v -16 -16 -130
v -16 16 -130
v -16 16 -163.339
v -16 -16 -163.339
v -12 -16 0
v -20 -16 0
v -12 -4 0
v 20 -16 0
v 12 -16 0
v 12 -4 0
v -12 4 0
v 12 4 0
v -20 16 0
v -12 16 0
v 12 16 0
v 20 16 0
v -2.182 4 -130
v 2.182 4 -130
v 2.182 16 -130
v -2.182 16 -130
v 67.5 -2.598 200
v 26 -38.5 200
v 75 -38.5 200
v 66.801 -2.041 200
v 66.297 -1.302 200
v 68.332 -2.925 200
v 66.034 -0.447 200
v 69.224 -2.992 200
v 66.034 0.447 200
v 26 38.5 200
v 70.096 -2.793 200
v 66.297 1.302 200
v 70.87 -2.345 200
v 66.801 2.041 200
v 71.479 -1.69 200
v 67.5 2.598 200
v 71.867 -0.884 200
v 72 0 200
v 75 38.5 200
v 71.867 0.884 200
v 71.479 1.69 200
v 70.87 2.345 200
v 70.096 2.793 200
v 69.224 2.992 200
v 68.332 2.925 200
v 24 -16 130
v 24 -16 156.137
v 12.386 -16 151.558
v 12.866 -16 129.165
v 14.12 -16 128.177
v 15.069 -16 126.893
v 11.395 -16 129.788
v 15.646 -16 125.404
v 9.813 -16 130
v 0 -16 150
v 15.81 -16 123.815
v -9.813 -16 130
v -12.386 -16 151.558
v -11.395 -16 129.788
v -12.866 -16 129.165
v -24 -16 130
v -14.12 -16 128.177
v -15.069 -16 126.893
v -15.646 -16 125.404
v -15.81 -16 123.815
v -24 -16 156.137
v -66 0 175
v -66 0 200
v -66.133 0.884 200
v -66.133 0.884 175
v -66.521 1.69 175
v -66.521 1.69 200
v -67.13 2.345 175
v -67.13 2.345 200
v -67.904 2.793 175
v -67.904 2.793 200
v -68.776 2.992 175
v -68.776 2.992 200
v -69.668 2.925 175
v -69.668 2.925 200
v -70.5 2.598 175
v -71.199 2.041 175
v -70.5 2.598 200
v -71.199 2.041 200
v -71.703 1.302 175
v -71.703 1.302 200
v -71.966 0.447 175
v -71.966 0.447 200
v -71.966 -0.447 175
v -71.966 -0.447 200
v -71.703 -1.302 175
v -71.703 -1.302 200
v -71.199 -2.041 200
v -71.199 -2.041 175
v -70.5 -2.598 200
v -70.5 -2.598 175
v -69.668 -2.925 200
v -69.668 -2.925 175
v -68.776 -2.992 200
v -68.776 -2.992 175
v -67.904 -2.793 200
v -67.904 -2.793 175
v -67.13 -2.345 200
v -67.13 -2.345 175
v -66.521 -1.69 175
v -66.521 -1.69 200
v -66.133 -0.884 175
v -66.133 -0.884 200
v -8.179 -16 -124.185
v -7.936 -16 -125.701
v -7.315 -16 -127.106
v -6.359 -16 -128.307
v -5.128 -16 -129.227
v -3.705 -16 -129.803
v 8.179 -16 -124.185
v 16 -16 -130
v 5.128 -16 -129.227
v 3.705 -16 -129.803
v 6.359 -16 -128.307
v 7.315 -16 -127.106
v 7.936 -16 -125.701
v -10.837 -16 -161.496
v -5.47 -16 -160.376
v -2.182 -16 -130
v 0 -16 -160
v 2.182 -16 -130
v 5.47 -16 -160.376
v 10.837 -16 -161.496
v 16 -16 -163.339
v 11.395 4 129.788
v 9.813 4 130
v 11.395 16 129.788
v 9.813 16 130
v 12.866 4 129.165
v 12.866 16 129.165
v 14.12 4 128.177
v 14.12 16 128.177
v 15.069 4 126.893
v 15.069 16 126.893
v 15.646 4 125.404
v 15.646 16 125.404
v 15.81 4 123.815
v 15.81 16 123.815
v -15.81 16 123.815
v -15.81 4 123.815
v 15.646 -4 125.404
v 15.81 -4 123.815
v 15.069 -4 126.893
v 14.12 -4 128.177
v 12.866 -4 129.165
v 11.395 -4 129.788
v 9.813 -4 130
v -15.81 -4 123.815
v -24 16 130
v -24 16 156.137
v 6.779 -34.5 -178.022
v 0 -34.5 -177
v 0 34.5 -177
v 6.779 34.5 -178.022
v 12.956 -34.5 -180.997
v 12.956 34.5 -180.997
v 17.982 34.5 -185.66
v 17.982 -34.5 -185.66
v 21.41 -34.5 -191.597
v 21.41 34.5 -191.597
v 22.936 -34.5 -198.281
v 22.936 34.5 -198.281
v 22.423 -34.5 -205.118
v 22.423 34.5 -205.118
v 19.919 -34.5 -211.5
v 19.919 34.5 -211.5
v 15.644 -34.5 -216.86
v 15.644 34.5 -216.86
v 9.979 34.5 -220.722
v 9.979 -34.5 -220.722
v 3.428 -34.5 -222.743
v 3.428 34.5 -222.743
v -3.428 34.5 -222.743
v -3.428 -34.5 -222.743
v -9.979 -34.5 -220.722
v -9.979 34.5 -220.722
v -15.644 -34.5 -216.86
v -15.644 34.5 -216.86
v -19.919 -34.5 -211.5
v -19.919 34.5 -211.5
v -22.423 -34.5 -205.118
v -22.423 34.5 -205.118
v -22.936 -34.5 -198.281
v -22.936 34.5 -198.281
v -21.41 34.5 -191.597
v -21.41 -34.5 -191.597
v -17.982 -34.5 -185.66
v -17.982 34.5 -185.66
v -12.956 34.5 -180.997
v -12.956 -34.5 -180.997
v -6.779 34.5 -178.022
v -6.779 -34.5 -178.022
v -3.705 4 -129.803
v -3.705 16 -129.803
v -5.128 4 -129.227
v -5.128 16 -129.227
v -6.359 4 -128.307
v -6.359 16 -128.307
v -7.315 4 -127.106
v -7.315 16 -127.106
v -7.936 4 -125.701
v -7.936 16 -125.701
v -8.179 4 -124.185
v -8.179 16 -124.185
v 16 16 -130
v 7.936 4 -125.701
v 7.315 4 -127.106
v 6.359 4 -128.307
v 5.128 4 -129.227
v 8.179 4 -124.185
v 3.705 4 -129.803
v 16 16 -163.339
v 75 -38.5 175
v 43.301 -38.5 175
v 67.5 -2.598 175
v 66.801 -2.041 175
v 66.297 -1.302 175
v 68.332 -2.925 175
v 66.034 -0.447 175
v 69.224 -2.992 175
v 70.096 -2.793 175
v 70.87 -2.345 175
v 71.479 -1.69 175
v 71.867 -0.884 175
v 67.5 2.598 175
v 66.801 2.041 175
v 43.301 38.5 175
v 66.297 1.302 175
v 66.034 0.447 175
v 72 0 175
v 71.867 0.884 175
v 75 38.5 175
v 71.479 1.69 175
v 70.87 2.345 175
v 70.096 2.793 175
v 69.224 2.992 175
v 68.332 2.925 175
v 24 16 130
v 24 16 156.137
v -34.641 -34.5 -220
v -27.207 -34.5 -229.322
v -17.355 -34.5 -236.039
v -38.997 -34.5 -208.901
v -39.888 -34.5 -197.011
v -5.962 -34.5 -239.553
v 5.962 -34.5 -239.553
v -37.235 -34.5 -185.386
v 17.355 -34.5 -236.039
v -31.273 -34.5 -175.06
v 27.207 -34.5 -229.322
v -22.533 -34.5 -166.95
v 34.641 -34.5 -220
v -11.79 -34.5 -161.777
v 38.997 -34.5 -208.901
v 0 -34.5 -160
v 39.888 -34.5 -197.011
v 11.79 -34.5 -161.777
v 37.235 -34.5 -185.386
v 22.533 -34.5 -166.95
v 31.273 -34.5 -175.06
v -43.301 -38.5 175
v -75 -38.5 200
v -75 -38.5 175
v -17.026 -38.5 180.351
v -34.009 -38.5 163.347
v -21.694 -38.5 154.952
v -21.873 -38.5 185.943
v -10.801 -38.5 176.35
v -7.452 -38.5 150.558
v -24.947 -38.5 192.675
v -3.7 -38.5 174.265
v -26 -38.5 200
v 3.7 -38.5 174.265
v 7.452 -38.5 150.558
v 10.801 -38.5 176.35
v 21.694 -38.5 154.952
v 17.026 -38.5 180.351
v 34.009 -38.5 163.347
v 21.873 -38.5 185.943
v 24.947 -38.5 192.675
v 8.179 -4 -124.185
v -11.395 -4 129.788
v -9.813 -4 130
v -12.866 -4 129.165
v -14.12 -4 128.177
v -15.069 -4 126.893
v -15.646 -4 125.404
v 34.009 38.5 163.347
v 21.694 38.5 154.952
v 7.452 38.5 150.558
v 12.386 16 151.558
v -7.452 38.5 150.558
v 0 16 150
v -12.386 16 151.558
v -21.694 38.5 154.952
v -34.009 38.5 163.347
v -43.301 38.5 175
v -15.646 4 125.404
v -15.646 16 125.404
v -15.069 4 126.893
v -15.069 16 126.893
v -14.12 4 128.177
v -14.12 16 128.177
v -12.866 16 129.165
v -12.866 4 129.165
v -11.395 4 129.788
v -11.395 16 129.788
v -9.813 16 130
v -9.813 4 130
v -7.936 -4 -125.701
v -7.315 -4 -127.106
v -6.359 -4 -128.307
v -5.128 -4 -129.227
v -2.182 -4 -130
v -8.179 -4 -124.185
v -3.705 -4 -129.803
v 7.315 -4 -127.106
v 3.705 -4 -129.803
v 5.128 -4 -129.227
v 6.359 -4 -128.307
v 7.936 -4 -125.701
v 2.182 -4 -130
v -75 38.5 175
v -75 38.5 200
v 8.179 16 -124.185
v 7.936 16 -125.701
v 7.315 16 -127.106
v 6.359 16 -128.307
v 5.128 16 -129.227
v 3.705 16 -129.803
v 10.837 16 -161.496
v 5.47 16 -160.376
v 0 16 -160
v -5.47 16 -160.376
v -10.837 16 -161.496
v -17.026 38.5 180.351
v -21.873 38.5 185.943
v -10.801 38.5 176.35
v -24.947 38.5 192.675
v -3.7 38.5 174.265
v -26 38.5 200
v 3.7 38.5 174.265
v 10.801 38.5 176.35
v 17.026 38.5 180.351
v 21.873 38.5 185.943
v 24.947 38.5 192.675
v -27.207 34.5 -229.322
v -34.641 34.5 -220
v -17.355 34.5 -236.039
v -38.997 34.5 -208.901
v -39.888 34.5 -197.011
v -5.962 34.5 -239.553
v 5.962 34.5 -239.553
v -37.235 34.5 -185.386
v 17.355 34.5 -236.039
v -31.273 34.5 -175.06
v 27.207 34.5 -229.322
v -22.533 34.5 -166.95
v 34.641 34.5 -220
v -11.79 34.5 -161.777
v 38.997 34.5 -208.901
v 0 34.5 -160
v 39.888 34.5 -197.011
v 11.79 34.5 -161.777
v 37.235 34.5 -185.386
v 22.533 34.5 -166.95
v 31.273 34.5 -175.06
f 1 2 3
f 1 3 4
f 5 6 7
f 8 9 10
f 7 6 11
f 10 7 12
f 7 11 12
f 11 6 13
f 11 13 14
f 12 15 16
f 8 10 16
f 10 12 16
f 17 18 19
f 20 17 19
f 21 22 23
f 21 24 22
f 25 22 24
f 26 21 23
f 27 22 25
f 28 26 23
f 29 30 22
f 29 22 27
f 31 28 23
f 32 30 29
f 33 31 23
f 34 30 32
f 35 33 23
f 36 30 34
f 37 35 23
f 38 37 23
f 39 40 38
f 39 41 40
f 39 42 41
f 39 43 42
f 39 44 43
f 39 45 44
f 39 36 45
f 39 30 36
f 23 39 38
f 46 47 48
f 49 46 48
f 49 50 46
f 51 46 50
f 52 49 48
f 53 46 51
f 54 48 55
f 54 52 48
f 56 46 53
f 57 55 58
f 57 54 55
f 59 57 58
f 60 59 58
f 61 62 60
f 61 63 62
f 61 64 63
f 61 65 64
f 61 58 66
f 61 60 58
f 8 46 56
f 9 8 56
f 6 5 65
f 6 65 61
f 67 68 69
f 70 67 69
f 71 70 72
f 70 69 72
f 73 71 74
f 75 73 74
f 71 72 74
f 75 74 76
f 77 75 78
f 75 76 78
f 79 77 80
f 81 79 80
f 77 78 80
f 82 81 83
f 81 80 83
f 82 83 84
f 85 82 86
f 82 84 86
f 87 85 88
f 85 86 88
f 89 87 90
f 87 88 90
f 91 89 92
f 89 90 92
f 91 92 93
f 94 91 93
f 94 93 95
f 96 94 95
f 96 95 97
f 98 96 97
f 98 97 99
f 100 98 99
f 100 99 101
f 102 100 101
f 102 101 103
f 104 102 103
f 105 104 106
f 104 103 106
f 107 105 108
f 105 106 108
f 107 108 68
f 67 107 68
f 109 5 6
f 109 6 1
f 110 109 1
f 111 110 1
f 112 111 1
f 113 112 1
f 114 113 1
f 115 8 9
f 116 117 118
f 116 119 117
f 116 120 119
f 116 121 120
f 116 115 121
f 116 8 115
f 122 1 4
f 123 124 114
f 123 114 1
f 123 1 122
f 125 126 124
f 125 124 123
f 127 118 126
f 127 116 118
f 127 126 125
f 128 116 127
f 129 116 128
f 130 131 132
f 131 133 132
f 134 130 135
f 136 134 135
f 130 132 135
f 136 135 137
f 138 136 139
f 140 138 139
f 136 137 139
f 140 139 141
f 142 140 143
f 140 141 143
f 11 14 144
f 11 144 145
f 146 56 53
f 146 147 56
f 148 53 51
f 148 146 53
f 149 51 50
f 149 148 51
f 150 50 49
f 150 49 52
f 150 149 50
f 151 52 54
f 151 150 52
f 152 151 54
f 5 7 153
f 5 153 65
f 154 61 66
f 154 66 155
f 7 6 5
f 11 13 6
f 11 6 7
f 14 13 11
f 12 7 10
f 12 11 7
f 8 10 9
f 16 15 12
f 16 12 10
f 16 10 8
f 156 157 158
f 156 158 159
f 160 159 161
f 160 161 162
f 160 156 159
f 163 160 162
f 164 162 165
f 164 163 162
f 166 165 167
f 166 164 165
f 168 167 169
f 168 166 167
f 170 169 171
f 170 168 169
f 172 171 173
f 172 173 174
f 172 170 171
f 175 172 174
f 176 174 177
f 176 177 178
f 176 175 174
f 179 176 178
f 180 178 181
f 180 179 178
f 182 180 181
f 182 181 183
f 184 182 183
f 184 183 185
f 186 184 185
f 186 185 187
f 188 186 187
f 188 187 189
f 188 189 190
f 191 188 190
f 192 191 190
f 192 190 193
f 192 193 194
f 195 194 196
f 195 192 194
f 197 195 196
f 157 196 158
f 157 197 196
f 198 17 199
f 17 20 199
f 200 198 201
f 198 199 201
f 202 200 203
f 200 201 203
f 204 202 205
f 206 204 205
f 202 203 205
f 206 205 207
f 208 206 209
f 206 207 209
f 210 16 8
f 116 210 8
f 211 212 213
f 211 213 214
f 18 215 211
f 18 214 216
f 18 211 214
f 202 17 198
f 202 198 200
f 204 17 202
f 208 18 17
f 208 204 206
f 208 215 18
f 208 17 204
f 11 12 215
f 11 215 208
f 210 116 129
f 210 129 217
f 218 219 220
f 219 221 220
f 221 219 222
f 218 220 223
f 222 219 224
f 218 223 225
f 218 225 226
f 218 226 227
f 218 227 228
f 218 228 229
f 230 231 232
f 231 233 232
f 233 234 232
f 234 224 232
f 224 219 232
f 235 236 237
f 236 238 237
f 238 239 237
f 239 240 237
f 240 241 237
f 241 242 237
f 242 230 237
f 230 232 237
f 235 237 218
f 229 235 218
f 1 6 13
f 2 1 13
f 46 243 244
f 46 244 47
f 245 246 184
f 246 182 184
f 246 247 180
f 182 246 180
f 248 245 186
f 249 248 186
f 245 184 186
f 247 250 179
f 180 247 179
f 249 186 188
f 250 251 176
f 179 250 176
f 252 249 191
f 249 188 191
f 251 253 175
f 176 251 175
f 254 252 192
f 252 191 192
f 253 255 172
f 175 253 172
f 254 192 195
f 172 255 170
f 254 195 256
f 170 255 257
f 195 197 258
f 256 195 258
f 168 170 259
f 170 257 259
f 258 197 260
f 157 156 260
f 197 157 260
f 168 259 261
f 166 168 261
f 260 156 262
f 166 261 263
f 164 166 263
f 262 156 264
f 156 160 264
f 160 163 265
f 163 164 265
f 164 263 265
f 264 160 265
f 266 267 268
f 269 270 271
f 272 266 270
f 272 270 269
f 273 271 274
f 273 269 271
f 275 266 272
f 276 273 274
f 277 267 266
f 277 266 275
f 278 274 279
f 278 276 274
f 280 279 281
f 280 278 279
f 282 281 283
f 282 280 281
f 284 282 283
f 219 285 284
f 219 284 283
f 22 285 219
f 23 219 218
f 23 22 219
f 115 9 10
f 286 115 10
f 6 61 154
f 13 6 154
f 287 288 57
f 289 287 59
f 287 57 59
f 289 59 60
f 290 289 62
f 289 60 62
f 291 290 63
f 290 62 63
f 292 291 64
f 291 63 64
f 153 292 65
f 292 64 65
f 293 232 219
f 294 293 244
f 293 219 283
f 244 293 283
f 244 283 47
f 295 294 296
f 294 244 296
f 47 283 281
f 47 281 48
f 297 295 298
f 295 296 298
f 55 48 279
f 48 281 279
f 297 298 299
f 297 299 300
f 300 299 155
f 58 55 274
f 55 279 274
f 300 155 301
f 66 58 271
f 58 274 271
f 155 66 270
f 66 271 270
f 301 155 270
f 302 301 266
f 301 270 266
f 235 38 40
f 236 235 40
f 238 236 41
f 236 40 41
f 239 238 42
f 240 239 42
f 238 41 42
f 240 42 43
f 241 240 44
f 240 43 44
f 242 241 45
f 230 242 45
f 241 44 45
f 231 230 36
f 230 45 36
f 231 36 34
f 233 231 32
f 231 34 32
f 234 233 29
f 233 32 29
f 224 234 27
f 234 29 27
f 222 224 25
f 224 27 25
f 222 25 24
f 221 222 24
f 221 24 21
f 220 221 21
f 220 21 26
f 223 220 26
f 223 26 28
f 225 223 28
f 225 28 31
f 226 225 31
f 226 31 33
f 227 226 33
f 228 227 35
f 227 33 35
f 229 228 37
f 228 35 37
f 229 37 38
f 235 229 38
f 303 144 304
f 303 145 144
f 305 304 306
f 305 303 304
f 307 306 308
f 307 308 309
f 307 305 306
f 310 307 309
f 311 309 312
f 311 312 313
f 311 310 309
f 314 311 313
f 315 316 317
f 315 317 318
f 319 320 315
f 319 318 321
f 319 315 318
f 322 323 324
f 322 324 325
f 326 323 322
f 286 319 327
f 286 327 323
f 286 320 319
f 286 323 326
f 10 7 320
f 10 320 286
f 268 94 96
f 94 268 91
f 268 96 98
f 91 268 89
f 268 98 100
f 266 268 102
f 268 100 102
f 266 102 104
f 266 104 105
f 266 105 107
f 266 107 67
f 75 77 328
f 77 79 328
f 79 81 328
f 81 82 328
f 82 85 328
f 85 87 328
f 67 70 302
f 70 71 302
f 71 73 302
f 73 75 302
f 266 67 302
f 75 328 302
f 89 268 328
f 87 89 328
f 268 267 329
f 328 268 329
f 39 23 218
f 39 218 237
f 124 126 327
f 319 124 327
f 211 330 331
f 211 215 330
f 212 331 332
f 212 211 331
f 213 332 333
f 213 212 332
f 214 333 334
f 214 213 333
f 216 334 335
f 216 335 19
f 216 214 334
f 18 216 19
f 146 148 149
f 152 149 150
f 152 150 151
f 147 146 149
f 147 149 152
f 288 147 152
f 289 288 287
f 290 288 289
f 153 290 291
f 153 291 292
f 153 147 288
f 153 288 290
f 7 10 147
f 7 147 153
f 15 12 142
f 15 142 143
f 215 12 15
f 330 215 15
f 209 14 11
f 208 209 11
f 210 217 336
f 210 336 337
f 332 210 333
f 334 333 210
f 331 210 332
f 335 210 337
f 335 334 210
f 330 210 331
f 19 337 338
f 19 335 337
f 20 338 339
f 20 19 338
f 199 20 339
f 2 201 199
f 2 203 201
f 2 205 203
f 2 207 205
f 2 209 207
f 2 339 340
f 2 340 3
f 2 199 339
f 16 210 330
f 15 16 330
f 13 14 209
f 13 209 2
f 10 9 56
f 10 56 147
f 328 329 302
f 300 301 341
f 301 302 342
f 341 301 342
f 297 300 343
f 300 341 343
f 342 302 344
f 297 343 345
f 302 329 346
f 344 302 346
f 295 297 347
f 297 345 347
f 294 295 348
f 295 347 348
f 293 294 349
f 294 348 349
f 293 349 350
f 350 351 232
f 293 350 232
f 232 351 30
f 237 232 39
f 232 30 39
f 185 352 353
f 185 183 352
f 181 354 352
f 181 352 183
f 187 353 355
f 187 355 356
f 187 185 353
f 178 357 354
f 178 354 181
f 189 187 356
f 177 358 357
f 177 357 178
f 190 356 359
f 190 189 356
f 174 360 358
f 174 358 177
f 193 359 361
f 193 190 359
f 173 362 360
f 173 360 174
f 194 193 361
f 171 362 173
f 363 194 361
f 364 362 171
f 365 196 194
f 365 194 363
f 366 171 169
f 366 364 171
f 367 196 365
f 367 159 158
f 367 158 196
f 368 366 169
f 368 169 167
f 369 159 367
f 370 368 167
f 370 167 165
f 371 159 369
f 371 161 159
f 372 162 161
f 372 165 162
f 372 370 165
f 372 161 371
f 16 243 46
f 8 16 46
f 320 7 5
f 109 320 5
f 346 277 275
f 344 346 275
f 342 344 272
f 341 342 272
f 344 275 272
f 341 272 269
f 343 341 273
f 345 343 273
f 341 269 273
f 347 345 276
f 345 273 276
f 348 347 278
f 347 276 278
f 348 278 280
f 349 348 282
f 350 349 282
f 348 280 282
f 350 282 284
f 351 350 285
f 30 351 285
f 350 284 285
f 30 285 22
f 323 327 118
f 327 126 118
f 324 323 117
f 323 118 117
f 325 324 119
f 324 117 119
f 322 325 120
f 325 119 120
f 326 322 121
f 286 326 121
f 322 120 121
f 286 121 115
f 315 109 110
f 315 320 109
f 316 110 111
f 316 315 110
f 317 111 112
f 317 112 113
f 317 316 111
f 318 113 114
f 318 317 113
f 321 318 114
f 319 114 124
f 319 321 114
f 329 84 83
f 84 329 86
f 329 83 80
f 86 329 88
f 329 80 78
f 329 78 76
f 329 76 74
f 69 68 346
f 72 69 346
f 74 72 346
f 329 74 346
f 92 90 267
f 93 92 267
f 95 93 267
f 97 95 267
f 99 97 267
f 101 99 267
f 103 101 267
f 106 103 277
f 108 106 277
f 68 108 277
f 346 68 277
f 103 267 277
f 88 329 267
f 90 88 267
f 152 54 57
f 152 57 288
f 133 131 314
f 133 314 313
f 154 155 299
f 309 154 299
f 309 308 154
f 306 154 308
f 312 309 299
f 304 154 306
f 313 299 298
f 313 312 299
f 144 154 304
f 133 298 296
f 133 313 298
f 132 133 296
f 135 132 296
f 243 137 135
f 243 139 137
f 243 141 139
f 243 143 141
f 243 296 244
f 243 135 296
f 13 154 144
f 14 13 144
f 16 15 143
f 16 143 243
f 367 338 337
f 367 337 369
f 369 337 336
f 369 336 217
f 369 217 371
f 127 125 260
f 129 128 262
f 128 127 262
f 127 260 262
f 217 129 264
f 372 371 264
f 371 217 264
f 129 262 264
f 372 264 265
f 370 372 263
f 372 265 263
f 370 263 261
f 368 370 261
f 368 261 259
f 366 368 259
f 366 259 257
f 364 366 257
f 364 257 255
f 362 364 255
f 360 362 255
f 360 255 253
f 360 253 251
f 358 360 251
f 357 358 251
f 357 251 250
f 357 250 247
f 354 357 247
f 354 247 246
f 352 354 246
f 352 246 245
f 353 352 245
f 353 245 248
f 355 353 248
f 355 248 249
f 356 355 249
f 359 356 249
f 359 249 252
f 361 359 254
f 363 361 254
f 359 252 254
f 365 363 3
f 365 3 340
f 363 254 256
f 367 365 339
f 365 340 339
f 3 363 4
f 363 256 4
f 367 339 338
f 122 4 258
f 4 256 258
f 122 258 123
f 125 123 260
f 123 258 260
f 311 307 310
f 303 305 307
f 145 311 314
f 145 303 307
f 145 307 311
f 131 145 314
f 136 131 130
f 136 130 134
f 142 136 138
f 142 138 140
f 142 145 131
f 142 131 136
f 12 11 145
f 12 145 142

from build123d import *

# Parameters (mm, degrees)
BOSS_EXTRUDE1_DEPTH      = 34.5
BOSS_EXTRUDE1_DEPTH_BACK = 34.5
SKETCH1_R                = 40
SKETCH1_R_2              = 23
BOSS_EXTRUDE2_DEPTH      = 38.5
BOSS_EXTRUDE2_DEPTH_BACK = 38.5
BOSS_EXTRUDE4_REACH      = 337.98
BOSS_EXTRUDE4_END_RADIUS = 23
BOSS_EXTRUDE5_REACH      = 377.343
BOSS_EXTRUDE5_END_RADIUS = 26
SKETCH5_W                = 37
SKETCH5_H                = 77
SKETCH5_R                = 3
BOSS_EXTRUDE6_DEPTH      = 25
SKETCH7_W                = 26.136575601
SKETCH7_H                = 32
BOSS_EXTRUDE7_DEPTH      = 46
FILLET1_R                = 6
SKETCH8_W                = 33.33939444
SKETCH8_H                = 32
BOSS_EXTRUDE8_DEPTH      = 30
FILLET2_R                = 6


with BuildPart() as part:
    # Sketch1 → Boss-Extrude1 (new, two sides: drawn at the far end of the back side and taken through both)
    with BuildSketch(Plane(origin=(0, 0, 0), x_dir=(1, 0, 0), z_dir=(0, 1, 0)).offset(-BOSS_EXTRUDE1_DEPTH_BACK)):
        with Locations((0, 200)):
            Circle(SKETCH1_R)
        with Locations((0, 200)):
            Circle(SKETCH1_R_2, mode=Mode.SUBTRACT)
    extrude(amount=BOSS_EXTRUDE1_DEPTH + BOSS_EXTRUDE1_DEPTH_BACK)



with BuildPart() as body_2:
    # Sketch1<6> → Boss-Extrude2 (new, two sides: drawn at the far end of the back side and taken through both)
    with BuildSketch(Plane(origin=(0, 0, 0), x_dir=(1, 0, 0), z_dir=(0, 1, 0)).offset(-BOSS_EXTRUDE2_DEPTH_BACK)):
        with BuildLine():
            ThreePointArc((50, -200), (0, -150), (-50, -200))
            Line((-50, -200), (-26, -200))
            ThreePointArc((-26, -200), (0, -174), (26, -200))
            Line((26, -200), (50, -200))
        make_face()
    extrude(amount=BOSS_EXTRUDE2_DEPTH + BOSS_EXTRUDE2_DEPTH_BACK)



with BuildPart() as body_3:
    # Sketch3 → Loft1 section 0
    with BuildSketch(Plane.XY.offset(130)):
        with BuildLine():
            Line((-24, -16), (-24, 16))
            Line((-24, 16), (-16, 16))
            Line((-16, 16), (-16, 4))
            Line((-16, 4), (16, 4))
            Line((16, 4), (16, 16))
            Line((16, 16), (24, 16))
            Line((24, 16), (24, -16))
            Line((24, -16), (16, -16))
            Line((16, -16), (16, -4))
            Line((16, -4), (-16, -4))
            Line((-16, -4), (-16, -16))
            Line((-16, -16), (-24, -16))
        make_face()
    # Sketch4 → Loft1 section 1
    with BuildSketch(Plane.XY):
        with BuildLine():
            Line((-20, 16), (-12, 16))
            Line((-12, 16), (-12, 4))
            Line((-12, 4), (12, 4))
            Line((12, 4), (12, 16))
            Line((12, 16), (20, 16))
            Line((20, 16), (20, -16))
            Line((20, -16), (12, -16))
            Line((12, -16), (12, -4))
            Line((12, -4), (-12, -4))
            Line((-12, -4), (-12, -16))
            Line((-12, -16), (-20, -16))
            Line((-20, -16), (-20, 16))
        make_face()
    loft()


with BuildPart() as body_4:
    # Sketch4<3> → Loft3 section 0
    with BuildSketch(Plane.XY):
        with BuildLine():
            Line((-20, 16), (-12, 16))
            Line((-12, 16), (-12, 4))
            Line((-12, 4), (12, 4))
            Line((12, 4), (12, 16))
            Line((12, 16), (20, 16))
            Line((20, 16), (20, -16))
            Line((20, -16), (12, -16))
            Line((12, -16), (12, -4))
            Line((12, -4), (-12, -4))
            Line((-12, -4), (-12, -16))
            Line((-12, -16), (-20, -16))
            Line((-20, -16), (-20, 16))
        make_face()
    # Sketch2 → Loft3 section 1
    with BuildSketch(Plane.XY.offset(-130)):
        with BuildLine():
            Line((16, 16), (8, 16))
            Line((8, 16), (8, 4))
            Line((8, 4), (-8, 4))
            Line((-8, 4), (-8, 16))
            Line((-8, 16), (-16, 16))
            Line((-16, 16), (-16, -16))
            Line((-16, -16), (-8, -16))
            Line((-8, -16), (-8, -4))
            Line((-8, -4), (8, -4))
            Line((8, -4), (8, -16))
            Line((8, -16), (16, -16))
            Line((16, -16), (16, 16))
        make_face()
    loft()


with BuildPart() as part_1:
    add(part.part)

    add(body_4.part)  # Boss-Extrude4 merges body 4
    # Boss-Extrude4: up to this cylinder (the profile starts outside it)
    boss_extrude4_end = Plane(origin=(0, 0, -200), z_dir=(0, 1, 0)) * Cylinder(BOSS_EXTRUDE4_END_RADIUS, 722.96, mode=Mode.PRIVATE)
    # Sketch2<8> → Boss-Extrude4 (add, up to the surface)
    with BuildSketch(Plane.XY.offset(-130), mode=Mode.PRIVATE) as boss_extrude4_sk1:
        Polygon((16, 16), (8, 16), (8, 4), (-8, 4), (-8, 16), (-16, 16), (-16, -16), (-8, -16), (-8, -4), (8, -4), (8, -16), (16, -16), align=None)
    boss_extrude4_tool1 = extrude(boss_extrude4_sk1.sketch, amount=-BOSS_EXTRUDE4_REACH, mode=Mode.PRIVATE) - boss_extrude4_end
    add(boss_extrude4_tool1.solids().sort_by_distance((0, 0, -130))[0])

    # Sketch8 → Boss-Extrude8 (add)
    with BuildSketch(Plane(origin=(16, 0, 0), x_dir=(0, 0, -1), z_dir=(1, 0, 0))):
        with Locations((146.66969722, 0)):
            Rectangle(SKETCH8_W, SKETCH8_H)
    extrude(amount=-BOSS_EXTRUDE8_DEPTH)

    # Fillet2
    fillet2_edges = [part_1.edges().sort_by_distance(p)[0] for p in [
        (-8, -10, -130),
        (8, -10, -130),
        (-8, 10, -130),
        (8, 10, -130),
    ]]
    fillet(fillet2_edges, radius=FILLET2_R)


with BuildPart() as body_2_1:
    add(body_2.part)

    add(body_3.part)  # Boss-Extrude5 merges body 3
    # Boss-Extrude5: up to this cylinder (the profile starts outside it)
    boss_extrude5_end = Plane(origin=(0, 0, 200), z_dir=(0, 1, 0)) * Cylinder(BOSS_EXTRUDE5_END_RADIUS, 807.686, mode=Mode.PRIVATE)
    # Sketch3<3> → Boss-Extrude5 (add, up to the surface)
    with BuildSketch(Plane.XY.offset(130), mode=Mode.PRIVATE) as boss_extrude5_sk1:
        Polygon((-24, -16), (-24, 16), (-16, 16), (-16, 4), (16, 4), (16, 16), (24, 16), (24, -16), (16, -16), (16, -4), (-16, -4), (-16, -16), align=None)
    boss_extrude5_tool1 = extrude(boss_extrude5_sk1.sketch, amount=BOSS_EXTRUDE5_REACH, mode=Mode.PRIVATE) - boss_extrude5_end
    add(boss_extrude5_tool1.solids().sort_by_distance((0, 0, 130))[0])

    # Sketch5 → Boss-Extrude6 (add)
    # profile 1 of 2: a face of its own
    with BuildSketch(Plane.XY.offset(200)):
        with Locations((56.5, 0)):
            Rectangle(SKETCH5_W, SKETCH5_H)
        with Locations((69, 0)):
            Circle(SKETCH5_R, mode=Mode.SUBTRACT)
    # profile 2 of 2: a face of its own
    with BuildSketch(Plane.XY.offset(200)):
        with Locations((-56.5, 0)):
            Rectangle(SKETCH5_W, SKETCH5_H)
        with Locations((-69, 0)):
            Circle(SKETCH5_R, mode=Mode.SUBTRACT)
    extrude(amount=-BOSS_EXTRUDE6_DEPTH)

    # Sketch7 → Boss-Extrude7 (add)
    with BuildSketch(Plane(origin=(24, 0, 0), x_dir=(0, 0, -1), z_dir=(1, 0, 0))):
        with Locations((-143.068287801, 0)):
            Rectangle(SKETCH7_W, SKETCH7_H)
    extrude(amount=-BOSS_EXTRUDE7_DEPTH)

    # Fillet1
    fillet1_edges = [body_2_1.edges().sort_by_distance(p)[0] for p in [
        (16, 10, 130),
        (-16, 10, 130),
        (-16, -10, 130),
        (16, -10, 130),
    ]]
    fillet(fillet1_edges, radius=FILLET1_R)


solid = Compound([part_1.part, body_2_1.part])
